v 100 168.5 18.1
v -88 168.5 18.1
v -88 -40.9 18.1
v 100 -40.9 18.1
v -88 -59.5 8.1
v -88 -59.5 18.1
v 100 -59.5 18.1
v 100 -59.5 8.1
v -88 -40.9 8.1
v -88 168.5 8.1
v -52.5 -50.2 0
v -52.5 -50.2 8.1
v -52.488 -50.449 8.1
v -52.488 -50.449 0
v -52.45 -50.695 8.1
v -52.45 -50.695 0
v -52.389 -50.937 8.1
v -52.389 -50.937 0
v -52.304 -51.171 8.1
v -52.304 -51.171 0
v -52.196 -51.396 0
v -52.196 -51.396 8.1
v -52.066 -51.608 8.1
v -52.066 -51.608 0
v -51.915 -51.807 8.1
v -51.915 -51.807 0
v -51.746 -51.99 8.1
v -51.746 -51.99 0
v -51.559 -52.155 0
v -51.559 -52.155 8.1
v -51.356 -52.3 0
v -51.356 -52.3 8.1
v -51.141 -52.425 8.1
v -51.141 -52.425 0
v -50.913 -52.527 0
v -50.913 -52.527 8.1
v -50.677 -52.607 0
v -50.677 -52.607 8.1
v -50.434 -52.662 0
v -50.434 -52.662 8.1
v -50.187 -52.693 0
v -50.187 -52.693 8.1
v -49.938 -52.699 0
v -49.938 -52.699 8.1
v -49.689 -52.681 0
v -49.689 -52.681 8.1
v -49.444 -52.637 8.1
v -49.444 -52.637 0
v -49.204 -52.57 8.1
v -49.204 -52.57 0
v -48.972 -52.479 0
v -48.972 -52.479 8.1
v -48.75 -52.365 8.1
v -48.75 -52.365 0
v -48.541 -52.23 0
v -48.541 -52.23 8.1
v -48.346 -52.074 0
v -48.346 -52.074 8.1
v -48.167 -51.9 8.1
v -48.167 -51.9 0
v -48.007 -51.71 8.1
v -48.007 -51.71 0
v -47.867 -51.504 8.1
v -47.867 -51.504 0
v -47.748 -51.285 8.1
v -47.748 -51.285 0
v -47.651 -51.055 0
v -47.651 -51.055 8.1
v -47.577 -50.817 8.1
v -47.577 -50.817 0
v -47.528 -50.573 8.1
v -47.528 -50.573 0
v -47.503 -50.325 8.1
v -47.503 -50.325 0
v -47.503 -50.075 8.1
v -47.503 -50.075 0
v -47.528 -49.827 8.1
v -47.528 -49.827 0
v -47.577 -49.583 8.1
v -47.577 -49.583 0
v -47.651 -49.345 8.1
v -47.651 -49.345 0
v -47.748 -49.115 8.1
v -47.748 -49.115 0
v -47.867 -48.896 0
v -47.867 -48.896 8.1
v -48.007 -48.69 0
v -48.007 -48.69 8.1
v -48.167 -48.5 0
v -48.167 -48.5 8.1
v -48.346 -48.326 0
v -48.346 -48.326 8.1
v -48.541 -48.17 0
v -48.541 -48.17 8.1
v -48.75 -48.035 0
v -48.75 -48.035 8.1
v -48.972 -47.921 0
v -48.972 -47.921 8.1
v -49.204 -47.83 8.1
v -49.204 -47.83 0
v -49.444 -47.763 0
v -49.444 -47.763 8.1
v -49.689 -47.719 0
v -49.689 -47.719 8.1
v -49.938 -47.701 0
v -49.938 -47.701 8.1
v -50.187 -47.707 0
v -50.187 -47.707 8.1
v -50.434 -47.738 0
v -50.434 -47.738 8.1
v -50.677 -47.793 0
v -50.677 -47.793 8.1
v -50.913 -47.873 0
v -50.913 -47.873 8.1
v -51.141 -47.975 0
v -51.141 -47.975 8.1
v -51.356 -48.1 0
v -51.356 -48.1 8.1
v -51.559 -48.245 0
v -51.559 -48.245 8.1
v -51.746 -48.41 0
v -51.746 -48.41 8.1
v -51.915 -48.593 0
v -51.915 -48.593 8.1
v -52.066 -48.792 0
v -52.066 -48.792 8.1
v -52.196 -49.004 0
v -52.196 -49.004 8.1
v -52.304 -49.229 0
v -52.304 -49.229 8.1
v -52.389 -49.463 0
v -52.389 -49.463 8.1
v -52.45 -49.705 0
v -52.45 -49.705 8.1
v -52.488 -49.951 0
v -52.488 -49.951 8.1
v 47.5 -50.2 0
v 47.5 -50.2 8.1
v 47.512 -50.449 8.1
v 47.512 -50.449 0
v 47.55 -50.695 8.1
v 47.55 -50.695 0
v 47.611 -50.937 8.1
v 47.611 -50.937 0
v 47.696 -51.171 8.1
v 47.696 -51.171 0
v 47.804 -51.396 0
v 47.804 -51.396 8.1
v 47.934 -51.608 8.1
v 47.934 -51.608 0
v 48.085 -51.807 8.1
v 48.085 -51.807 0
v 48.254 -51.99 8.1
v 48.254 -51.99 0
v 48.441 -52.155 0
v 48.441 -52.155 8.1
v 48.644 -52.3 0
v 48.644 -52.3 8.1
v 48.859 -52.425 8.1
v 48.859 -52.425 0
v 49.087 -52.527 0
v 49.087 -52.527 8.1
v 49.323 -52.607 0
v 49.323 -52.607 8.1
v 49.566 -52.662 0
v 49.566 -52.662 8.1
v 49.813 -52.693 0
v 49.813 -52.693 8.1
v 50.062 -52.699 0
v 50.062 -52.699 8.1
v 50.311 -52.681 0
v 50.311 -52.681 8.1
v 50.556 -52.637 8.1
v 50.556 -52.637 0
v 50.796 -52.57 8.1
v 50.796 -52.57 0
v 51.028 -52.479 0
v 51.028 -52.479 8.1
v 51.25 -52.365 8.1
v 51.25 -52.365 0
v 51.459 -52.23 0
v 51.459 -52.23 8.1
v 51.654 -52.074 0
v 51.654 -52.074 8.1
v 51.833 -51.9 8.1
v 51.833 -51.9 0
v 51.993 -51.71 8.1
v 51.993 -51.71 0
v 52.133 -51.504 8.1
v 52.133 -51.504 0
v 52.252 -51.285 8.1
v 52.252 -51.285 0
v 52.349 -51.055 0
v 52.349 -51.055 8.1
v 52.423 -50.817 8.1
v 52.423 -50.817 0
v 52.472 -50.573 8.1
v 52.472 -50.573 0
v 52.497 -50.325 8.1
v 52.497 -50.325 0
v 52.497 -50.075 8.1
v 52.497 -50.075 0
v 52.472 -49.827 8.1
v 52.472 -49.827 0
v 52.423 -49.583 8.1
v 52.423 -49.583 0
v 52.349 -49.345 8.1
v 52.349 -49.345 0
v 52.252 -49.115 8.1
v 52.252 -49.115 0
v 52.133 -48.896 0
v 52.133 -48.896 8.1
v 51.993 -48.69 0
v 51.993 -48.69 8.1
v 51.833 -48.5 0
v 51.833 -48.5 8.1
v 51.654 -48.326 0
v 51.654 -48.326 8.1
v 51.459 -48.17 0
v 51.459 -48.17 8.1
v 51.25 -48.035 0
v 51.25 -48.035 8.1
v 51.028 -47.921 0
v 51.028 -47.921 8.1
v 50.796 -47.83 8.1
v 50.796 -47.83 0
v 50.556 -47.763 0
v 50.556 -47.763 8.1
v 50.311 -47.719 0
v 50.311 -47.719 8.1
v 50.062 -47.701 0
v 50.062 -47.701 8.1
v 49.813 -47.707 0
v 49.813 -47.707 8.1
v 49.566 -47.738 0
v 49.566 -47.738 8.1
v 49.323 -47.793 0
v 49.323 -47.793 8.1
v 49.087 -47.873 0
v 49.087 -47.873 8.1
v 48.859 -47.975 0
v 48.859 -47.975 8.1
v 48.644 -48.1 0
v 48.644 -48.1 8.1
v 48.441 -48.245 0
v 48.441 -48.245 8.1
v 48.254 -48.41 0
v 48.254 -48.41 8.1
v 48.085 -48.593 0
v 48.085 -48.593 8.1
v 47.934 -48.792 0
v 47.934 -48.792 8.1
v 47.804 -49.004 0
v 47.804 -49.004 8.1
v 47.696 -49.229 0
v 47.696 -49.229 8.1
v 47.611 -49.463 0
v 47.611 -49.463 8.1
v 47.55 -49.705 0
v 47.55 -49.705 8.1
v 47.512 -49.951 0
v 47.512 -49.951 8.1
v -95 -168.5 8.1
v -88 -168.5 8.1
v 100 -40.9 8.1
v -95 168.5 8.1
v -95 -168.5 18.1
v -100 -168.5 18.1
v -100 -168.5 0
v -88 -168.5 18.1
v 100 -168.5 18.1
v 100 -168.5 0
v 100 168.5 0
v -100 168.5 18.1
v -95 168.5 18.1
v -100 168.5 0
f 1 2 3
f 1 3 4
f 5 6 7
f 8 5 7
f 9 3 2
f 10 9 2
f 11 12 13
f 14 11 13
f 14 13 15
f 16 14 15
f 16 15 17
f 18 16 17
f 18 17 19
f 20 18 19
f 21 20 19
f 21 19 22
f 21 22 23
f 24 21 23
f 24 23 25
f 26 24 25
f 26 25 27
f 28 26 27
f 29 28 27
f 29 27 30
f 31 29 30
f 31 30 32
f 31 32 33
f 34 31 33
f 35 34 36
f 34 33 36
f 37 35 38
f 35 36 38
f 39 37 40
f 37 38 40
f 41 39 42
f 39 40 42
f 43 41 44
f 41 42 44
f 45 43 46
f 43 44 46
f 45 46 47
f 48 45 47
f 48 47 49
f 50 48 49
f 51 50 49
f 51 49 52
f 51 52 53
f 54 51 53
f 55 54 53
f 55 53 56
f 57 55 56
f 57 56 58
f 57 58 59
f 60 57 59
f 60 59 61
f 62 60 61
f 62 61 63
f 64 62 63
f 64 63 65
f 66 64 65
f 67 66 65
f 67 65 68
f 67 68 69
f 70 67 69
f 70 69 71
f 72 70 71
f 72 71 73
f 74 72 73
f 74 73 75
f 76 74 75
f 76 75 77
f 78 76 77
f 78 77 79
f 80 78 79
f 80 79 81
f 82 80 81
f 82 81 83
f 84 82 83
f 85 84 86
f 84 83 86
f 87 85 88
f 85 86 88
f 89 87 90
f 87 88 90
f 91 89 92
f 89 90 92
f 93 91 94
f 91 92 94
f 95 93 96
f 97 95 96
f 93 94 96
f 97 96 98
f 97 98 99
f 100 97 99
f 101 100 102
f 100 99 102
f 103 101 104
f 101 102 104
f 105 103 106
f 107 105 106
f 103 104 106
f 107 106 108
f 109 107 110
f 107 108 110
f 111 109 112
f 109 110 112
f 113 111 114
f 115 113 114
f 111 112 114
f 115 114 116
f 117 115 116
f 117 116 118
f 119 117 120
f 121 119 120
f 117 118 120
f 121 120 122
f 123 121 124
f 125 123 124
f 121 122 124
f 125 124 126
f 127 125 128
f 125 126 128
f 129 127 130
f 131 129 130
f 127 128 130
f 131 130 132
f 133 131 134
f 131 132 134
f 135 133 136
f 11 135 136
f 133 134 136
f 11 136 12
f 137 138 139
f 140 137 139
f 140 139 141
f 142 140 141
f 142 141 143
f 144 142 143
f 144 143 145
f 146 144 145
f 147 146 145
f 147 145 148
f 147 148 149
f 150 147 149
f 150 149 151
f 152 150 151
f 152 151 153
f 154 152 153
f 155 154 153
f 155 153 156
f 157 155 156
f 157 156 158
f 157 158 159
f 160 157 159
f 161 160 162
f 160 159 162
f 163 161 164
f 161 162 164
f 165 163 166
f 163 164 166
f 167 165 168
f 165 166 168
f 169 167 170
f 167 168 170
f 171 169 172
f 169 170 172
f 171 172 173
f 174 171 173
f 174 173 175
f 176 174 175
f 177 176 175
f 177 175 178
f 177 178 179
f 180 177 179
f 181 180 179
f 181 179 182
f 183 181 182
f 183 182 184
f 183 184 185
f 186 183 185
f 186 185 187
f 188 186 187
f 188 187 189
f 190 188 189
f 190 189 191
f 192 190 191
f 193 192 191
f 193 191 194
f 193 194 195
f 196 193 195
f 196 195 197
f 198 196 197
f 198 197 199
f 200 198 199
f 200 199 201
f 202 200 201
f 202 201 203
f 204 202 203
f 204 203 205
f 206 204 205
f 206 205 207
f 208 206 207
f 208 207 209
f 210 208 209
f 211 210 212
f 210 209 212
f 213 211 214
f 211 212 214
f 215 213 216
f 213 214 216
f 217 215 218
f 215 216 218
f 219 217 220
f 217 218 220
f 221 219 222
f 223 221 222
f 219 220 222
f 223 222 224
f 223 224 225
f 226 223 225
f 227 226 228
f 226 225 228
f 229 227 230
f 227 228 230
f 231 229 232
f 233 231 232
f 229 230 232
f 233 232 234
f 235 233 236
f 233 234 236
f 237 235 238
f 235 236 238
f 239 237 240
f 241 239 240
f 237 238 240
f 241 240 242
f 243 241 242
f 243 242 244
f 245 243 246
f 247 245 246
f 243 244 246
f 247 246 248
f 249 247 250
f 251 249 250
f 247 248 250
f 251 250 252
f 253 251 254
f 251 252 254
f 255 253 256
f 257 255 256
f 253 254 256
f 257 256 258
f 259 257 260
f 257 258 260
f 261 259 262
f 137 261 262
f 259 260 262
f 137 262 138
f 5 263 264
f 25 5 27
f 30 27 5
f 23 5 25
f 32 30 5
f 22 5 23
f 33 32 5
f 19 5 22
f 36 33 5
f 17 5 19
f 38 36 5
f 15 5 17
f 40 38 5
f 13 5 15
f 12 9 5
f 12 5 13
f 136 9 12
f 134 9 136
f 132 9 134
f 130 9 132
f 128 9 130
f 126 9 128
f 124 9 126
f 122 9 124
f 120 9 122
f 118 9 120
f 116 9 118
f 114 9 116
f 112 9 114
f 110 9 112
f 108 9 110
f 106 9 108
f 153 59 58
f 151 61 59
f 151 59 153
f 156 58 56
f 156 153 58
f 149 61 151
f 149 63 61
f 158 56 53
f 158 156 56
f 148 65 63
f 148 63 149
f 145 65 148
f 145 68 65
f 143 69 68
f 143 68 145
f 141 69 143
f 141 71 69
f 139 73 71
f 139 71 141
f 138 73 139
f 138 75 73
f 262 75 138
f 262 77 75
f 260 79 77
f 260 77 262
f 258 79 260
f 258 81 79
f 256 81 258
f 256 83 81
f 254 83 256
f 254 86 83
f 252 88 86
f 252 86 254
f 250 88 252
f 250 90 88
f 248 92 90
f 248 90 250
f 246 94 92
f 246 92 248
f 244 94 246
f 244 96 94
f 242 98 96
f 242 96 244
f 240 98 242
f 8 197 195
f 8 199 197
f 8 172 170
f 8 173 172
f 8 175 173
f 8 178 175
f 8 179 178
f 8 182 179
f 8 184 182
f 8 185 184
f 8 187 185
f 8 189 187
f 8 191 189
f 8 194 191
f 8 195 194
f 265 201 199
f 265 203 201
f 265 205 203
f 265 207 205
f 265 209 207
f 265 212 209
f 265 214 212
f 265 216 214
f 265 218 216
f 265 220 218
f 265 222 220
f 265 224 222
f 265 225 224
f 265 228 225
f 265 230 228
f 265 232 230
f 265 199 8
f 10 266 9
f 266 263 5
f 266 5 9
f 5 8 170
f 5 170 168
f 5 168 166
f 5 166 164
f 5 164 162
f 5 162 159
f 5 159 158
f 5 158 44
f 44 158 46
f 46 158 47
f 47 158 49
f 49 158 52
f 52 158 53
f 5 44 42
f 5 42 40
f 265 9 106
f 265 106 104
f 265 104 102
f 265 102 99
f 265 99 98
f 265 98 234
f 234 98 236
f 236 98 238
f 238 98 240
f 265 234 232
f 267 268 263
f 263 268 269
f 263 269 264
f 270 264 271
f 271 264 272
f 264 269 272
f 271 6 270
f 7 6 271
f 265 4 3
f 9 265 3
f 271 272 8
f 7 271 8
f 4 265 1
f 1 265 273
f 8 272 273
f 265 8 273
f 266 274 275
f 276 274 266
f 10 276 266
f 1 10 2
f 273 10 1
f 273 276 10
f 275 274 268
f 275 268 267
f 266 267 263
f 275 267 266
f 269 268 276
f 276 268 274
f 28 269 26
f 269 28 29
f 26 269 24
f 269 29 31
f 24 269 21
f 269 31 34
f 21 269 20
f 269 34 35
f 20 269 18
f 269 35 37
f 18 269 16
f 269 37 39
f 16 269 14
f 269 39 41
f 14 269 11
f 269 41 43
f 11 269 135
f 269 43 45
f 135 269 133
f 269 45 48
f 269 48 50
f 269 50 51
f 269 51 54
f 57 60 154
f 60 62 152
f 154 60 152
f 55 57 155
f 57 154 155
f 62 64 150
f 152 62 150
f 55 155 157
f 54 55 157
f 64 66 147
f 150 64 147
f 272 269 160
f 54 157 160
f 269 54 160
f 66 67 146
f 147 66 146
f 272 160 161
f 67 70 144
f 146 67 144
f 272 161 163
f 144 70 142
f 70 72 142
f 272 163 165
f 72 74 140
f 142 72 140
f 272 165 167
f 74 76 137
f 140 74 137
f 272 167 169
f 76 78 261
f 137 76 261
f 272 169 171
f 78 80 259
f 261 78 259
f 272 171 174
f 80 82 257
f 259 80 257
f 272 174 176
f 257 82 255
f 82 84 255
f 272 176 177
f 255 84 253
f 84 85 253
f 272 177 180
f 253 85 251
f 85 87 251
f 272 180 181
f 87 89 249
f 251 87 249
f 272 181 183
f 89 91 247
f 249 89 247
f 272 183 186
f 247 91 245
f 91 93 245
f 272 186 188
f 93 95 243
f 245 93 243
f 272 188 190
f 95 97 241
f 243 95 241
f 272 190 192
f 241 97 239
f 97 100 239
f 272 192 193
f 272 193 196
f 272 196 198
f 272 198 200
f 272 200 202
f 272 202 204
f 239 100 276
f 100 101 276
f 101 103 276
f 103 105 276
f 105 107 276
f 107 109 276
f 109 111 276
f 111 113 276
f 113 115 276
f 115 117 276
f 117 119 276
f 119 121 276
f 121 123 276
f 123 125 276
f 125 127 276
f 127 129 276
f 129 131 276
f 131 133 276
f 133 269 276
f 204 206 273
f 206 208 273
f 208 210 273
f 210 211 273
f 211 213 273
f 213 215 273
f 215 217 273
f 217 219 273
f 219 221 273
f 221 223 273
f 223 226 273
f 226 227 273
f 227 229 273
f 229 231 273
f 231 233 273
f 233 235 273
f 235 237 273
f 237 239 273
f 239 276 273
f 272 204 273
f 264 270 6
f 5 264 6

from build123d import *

# Parameters (mm, degrees)
F0_W      = 200
F0_H      = 337
F1_DEPTH  = 18.1
F2_W      = 25
F2_H      = 18.6
F2_W_2    = 150
F3_DEPTH  = 10
F5_DEPTH  = 25
F6_W      = 7
F6_H      = 209.4
F7_DEPTH  = 10
F8_W      = 7
F8_H      = 109
F9_DEPTH  = 10
F10_W     = 5
F10_H     = 18.6
F11_DEPTH = 13


with BuildPart() as f1:
    # F0 (on Top) → F1 (new body)
    with BuildSketch(Plane.XY):
        Rectangle(F0_W, F0_H)
    extrude(amount=F1_DEPTH)

    # F2 (on face) → F3 (cut)
    with BuildSketch(Plane.XY.offset(18.1)):
        with Locations((-87.5, -50.2)):
            Rectangle(F2_W, F2_H)
        with Locations((-62.5, -50.2)):
            Rectangle(F2_W, F2_H)
        with Locations((25, -50.2)):
            Rectangle(F2_W_2, F2_H)
        with Locations((112.5, -50.2)):
            Rectangle(F2_W, F2_H)
        with Locations((137.5, -50.2)):
            Rectangle(F2_W, F2_H)
    extrude(amount=-F3_DEPTH, mode=Mode.SUBTRACT)

    # F4 (on face) → F5 (cut)
    with BuildSketch(Plane.XY.offset(8.1)):
        with BuildLine():
            Line((-52.5, -50.2), (-50, -50.2))
            Line((-50, -50.2), (-47.5, -50.2))
            ThreePointArc((-47.5, -50.2), (-50, -47.7), (-52.5, -50.2))
        make_face()
        with BuildLine():
            Line((-47.5, -50.2), (-50, -50.2))
            Line((-50, -50.2), (-52.5, -50.2))
            ThreePointArc((-52.5, -50.2), (-50, -52.7), (-47.5, -50.2))
        make_face()
        with BuildLine():
            ThreePointArc((52.5, -50.2), (50, -47.7), (47.5, -50.2))
            Line((47.5, -50.2), (50, -50.2))
            Line((50, -50.2), (52.5, -50.2))
        make_face()
        with BuildLine():
            Line((50, -50.2), (47.5, -50.2))
            ThreePointArc((47.5, -50.2), (50, -52.7), (52.5, -50.2))
            Line((52.5, -50.2), (50, -50.2))
        make_face()
    extrude(amount=-F5_DEPTH, mode=Mode.SUBTRACT)

    # F6 (on face) → F7 (cut)
    with BuildSketch(Plane.XY.offset(18.1)):
        with Locations((-91.5, 63.8)):
            Rectangle(F6_W, F6_H)
    extrude(amount=-F7_DEPTH, mode=Mode.SUBTRACT)

    # F8 (on face) → F9 (cut)
    with BuildSketch(Plane.XY.offset(18.1)):
        with Locations((-91.5, -114)):
            Rectangle(F8_W, F8_H)
    extrude(amount=-F9_DEPTH, mode=Mode.SUBTRACT)

    # F10 (on face) → F11 (join)
    with BuildSketch(Plane.XY.offset(18.1)):
        with Locations((-97.5, -50.2)):
            Rectangle(F10_W, F10_H)
    extrude(amount=-F11_DEPTH)


solid = f1.part
